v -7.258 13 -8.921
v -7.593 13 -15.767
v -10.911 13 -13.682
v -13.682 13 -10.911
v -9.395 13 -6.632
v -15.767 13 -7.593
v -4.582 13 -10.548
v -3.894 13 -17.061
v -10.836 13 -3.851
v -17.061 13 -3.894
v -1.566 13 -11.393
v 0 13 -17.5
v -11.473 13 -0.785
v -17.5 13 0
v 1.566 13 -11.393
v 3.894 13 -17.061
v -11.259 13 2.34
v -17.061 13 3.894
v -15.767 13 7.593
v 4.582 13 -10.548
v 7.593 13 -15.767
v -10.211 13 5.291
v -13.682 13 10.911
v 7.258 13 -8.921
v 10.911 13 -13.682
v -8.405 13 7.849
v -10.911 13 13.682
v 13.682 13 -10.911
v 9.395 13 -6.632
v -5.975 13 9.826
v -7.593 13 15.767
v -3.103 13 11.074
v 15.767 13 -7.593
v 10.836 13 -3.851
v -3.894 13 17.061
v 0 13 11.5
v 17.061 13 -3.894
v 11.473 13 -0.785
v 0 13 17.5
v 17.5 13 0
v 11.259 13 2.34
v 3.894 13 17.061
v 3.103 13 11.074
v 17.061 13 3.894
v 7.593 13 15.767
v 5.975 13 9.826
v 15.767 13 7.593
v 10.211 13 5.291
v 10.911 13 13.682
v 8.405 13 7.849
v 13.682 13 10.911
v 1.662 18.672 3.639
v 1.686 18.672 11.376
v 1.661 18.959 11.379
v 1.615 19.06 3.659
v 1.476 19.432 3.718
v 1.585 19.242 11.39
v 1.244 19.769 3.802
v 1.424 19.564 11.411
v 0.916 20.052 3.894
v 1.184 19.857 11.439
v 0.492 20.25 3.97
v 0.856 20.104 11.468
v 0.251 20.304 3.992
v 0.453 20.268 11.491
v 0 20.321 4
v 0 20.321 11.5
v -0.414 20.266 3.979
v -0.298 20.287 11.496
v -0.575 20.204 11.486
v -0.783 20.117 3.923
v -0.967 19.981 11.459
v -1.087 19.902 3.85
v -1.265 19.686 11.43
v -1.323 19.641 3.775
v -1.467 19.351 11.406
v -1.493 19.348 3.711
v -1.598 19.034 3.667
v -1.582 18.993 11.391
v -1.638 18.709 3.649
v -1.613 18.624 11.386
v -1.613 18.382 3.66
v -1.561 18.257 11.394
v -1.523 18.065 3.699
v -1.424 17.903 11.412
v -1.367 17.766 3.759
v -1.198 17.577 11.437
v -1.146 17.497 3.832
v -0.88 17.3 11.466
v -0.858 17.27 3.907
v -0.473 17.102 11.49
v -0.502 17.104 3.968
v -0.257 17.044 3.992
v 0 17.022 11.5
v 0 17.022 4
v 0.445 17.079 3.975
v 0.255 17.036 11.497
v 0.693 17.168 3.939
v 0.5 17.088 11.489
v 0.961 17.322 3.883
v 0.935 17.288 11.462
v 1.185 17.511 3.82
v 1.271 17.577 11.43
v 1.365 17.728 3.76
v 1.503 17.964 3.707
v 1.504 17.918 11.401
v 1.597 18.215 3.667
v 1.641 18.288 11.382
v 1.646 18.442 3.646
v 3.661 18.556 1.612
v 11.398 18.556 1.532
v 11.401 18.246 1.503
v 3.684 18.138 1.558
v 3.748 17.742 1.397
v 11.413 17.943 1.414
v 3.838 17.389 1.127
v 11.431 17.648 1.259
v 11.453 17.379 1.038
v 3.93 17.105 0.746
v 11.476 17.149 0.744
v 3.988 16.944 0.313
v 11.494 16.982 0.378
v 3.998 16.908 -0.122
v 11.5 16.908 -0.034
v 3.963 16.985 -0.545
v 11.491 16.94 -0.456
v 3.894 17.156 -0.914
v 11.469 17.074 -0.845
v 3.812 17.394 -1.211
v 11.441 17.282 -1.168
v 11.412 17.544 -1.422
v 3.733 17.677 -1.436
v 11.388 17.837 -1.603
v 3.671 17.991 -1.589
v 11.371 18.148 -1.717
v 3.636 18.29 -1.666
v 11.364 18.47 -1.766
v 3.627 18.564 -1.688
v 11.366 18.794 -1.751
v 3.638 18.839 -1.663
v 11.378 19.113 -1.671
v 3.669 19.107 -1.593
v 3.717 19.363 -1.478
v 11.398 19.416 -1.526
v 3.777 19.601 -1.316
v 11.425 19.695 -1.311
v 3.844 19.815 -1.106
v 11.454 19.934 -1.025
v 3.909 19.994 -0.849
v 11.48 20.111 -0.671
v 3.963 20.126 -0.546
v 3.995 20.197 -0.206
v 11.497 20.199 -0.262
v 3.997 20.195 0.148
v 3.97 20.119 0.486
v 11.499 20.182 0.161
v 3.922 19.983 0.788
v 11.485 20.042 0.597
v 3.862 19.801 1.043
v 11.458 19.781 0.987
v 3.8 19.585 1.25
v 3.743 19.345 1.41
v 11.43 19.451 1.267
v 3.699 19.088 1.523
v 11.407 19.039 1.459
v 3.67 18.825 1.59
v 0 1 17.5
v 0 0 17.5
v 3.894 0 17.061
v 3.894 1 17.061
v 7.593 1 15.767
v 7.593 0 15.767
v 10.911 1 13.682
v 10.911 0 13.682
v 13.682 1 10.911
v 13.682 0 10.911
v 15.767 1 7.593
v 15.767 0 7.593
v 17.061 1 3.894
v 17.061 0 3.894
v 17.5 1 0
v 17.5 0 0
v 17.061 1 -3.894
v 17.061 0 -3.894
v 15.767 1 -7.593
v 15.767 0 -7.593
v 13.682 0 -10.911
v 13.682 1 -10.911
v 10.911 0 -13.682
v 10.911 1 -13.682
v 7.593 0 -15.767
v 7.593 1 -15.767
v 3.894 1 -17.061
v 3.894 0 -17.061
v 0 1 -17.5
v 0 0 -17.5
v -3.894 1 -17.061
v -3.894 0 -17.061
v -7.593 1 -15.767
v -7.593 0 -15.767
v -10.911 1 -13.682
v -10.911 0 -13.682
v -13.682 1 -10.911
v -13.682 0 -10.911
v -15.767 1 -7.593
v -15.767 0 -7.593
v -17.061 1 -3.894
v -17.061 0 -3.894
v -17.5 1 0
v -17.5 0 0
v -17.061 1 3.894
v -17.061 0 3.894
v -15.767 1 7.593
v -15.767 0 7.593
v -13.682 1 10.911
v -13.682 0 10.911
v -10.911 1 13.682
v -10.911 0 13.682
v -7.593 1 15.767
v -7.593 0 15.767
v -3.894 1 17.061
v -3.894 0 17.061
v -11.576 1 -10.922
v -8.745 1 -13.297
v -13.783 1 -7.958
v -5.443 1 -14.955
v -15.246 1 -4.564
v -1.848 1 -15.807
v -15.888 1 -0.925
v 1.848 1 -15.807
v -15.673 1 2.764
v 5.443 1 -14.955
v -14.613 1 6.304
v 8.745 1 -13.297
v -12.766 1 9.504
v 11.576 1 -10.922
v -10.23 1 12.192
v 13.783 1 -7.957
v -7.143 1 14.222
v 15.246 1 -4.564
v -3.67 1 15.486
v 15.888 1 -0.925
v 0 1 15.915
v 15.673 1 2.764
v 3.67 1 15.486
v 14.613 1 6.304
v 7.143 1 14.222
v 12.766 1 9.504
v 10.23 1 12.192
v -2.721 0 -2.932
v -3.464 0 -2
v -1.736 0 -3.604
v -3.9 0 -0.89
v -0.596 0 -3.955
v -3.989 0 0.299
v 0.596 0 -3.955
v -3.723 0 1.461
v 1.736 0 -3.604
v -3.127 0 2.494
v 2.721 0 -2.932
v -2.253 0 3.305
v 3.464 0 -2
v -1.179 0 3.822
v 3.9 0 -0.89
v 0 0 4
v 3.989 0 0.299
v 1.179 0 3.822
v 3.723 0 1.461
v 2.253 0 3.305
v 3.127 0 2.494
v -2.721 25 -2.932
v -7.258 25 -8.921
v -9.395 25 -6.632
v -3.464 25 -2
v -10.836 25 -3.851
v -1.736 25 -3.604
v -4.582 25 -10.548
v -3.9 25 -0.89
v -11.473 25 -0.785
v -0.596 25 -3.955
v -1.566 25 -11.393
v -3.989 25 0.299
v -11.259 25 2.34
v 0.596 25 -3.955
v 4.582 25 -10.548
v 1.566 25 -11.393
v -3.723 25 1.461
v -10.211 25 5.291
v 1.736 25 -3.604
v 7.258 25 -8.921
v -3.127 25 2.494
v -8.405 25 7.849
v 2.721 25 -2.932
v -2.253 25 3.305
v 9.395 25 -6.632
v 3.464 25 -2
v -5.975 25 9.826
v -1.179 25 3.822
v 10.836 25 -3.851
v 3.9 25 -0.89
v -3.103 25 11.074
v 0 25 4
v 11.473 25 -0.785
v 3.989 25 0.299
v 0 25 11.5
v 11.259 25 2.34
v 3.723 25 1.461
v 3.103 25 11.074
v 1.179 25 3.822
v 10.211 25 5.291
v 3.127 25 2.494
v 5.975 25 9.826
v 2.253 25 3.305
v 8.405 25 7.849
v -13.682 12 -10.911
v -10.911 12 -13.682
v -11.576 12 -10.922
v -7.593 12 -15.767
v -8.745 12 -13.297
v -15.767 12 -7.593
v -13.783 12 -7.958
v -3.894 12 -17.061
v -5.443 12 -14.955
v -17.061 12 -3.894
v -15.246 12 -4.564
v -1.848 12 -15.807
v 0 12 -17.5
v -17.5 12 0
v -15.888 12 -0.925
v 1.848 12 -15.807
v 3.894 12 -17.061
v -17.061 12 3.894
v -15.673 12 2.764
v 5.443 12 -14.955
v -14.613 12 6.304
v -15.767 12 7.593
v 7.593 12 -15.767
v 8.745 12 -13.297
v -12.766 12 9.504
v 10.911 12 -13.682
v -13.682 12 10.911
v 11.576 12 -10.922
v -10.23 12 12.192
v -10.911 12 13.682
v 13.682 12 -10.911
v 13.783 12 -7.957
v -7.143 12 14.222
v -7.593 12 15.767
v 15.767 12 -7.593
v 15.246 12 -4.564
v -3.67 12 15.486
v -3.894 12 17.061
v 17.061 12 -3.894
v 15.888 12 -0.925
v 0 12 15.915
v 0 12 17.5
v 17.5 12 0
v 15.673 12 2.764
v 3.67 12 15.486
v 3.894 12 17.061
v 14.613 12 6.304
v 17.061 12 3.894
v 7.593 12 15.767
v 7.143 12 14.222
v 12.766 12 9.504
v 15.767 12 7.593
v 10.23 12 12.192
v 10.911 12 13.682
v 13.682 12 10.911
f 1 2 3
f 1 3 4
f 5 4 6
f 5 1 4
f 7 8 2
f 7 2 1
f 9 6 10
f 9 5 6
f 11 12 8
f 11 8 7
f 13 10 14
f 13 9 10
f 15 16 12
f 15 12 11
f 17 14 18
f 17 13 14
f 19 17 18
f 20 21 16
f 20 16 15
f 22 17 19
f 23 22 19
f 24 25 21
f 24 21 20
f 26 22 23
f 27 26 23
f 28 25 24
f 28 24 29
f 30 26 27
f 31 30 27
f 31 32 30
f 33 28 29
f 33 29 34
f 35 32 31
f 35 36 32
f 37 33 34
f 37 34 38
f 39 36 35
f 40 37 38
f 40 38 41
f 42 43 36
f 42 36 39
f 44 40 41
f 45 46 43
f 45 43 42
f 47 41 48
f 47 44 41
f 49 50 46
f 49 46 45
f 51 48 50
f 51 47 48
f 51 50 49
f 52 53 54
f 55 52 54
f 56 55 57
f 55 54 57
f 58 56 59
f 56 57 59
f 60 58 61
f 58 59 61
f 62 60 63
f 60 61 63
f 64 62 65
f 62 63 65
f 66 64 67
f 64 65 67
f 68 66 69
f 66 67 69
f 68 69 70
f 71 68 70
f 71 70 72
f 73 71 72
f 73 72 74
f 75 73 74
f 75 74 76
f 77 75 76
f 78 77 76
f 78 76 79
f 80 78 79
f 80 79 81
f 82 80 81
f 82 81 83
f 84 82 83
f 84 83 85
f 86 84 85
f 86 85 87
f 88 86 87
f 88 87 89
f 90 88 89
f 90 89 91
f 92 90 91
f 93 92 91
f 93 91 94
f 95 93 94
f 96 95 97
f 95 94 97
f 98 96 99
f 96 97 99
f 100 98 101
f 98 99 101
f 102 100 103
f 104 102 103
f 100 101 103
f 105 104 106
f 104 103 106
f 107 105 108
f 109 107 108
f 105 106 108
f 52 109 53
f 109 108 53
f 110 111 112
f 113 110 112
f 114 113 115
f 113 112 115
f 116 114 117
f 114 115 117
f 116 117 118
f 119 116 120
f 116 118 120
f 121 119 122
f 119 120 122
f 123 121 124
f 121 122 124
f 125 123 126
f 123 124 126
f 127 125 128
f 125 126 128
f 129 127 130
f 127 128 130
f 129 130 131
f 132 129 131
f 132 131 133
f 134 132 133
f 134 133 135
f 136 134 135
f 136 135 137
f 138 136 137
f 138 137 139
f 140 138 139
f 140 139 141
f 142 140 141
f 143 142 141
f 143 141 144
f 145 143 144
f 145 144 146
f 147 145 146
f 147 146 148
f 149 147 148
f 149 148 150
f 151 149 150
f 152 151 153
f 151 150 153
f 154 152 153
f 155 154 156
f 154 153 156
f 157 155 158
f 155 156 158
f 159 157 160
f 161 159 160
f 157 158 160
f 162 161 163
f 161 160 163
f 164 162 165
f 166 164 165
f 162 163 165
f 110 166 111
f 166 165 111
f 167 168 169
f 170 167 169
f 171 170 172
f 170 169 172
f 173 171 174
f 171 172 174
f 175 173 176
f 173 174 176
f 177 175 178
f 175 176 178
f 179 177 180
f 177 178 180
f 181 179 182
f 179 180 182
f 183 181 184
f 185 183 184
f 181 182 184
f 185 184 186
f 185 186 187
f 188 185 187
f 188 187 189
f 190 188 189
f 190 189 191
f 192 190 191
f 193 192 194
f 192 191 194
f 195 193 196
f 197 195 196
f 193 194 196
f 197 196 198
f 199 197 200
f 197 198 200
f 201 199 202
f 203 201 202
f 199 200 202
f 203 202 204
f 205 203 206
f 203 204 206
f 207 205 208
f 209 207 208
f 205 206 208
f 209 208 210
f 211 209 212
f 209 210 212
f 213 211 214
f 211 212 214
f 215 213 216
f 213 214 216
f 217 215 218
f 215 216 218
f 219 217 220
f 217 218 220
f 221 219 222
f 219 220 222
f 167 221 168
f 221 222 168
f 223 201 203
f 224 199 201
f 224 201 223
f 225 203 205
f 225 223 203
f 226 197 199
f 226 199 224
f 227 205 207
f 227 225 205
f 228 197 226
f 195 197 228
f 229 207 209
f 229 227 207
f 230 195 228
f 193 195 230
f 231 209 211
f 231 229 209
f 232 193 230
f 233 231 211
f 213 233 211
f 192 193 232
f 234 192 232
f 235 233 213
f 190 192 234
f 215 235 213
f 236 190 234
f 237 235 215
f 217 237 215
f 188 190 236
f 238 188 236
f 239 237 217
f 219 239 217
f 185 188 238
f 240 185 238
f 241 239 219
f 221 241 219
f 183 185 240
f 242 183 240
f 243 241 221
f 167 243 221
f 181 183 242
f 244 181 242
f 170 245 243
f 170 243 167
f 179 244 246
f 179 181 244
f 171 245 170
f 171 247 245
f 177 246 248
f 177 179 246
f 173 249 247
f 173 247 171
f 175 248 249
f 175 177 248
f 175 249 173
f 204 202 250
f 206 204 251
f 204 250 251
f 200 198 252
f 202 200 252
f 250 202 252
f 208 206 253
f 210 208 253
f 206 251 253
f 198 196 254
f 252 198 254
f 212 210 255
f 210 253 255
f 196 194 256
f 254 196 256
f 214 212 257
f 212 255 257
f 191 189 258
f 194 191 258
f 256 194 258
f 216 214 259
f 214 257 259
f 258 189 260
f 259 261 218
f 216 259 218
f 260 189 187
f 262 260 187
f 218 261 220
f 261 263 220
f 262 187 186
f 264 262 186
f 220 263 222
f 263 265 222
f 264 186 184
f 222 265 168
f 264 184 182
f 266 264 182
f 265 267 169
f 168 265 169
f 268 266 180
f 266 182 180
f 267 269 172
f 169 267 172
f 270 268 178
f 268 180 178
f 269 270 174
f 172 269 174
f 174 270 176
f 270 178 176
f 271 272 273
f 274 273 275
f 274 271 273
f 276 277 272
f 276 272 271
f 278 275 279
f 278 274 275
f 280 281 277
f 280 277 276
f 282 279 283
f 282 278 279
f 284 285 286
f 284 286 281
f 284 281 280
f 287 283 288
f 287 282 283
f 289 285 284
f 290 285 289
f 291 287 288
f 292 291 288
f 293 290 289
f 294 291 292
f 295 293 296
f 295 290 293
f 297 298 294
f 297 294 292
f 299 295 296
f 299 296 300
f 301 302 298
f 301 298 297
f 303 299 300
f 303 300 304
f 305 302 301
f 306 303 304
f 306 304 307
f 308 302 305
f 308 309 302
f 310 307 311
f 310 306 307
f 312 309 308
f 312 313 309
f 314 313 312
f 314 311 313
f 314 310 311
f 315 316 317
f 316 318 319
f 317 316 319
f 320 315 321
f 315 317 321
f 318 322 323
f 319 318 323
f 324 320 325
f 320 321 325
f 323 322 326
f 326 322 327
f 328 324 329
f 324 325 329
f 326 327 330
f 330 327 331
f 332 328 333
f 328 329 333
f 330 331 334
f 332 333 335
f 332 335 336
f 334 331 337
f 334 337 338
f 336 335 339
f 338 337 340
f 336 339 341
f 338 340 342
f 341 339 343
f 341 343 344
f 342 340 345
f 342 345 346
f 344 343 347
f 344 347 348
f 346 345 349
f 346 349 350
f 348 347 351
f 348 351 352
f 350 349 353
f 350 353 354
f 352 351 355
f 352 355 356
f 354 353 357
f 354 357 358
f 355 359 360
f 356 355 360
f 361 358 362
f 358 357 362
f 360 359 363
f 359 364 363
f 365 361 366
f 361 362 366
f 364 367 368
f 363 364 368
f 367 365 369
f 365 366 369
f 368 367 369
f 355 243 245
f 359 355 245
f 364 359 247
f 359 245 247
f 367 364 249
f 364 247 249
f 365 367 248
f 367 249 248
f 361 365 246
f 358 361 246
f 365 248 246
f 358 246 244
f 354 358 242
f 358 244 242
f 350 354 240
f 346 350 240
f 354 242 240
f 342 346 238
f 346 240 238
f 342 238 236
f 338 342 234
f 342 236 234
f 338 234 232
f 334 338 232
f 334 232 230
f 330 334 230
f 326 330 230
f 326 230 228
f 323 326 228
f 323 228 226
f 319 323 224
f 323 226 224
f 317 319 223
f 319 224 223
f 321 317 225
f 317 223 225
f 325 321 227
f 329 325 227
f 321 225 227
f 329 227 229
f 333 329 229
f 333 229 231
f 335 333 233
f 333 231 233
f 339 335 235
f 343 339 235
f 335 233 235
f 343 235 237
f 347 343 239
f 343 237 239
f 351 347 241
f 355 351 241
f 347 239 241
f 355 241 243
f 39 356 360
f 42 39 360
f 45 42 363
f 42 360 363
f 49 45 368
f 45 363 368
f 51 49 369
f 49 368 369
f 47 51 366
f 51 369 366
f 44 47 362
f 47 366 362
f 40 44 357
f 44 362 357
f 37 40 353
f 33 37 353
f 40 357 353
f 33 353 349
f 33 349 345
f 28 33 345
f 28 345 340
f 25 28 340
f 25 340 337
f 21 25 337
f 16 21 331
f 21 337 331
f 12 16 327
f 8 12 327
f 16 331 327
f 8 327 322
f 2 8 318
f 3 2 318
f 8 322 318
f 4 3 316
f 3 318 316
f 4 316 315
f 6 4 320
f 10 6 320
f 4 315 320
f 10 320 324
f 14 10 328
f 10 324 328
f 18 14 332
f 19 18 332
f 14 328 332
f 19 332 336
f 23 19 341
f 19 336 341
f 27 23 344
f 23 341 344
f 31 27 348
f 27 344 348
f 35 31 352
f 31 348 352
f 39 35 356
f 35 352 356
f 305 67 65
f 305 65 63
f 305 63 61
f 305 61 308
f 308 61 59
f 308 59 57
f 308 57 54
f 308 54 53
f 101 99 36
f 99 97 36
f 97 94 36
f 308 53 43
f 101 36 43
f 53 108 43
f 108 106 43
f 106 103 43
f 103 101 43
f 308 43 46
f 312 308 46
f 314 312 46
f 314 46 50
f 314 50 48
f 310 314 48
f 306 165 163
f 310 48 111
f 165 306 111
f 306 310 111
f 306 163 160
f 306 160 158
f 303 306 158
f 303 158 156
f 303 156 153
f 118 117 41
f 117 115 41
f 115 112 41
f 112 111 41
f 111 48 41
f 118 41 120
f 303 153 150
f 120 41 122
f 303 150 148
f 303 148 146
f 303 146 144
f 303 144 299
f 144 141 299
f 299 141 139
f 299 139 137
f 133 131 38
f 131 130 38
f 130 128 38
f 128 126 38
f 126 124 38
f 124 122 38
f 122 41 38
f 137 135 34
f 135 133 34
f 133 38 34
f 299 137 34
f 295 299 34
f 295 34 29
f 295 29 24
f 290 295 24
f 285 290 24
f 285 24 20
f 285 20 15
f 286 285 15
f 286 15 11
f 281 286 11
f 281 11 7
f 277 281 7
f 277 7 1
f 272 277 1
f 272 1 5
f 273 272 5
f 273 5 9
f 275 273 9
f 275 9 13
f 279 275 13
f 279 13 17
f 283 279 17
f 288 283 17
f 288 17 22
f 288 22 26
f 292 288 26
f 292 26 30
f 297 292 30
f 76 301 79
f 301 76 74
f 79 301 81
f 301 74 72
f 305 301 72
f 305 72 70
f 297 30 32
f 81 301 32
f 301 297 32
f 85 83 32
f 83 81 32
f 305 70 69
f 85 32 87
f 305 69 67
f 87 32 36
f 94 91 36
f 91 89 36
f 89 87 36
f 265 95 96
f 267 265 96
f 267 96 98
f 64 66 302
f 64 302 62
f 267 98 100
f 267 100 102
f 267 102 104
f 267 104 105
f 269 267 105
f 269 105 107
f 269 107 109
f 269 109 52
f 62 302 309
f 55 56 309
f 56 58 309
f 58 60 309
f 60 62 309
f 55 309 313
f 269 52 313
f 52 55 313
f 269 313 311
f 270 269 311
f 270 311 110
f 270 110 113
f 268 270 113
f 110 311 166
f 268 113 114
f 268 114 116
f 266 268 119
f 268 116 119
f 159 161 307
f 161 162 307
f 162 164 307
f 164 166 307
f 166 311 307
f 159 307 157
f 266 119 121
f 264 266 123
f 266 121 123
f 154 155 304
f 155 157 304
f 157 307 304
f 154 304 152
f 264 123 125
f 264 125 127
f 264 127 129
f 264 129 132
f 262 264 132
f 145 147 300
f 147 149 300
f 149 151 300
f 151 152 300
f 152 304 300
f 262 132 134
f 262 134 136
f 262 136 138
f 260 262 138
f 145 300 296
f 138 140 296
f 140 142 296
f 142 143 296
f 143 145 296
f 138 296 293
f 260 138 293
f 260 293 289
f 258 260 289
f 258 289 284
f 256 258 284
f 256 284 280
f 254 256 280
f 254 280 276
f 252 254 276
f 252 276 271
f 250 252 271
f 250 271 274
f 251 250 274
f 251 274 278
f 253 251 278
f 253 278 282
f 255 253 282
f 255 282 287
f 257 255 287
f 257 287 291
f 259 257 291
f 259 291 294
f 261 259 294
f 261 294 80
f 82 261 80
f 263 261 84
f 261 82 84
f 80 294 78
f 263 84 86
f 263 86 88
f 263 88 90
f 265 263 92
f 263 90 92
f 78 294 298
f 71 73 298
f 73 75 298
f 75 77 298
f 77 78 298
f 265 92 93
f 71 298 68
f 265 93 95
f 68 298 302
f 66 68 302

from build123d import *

# Parameters (mm, degrees)
SKETCH_1_R                       = 17.5
EXTRUDE_1_DEPTH                  = 1
SKETCH_2_R                       = 15.915
EXTRUDE_2_DEPTH                  = 11
SKETCH_3_R                       = 17.5
EXTRUDE_3_DEPTH                  = 1
SKETCH_4_R                       = 11.5
EXTRUDE_4_DEPTH                  = 12
SKETCH_5_R                       = 4
CUT_EXTRUDE_1_DEPTH              = 36.178118199
HOLE_WIZARD_M4_1_REACH           = 40.674
HOLE_WIZARD_M4_1_BORE_R          = 1.65
HOLE_WIZARD_M4_1_ON_FACE_2_REACH = 40.693
HOLE_WIZARD_M4_1_BORE_2_R        = 1.65


with BuildPart() as part:
    # 草图1 → 凸台-拉伸1 (new body)
    with BuildSketch(Plane(origin=(0, 0, 0), x_dir=(1, 0, 0), z_dir=(0, 1, 0))):
        with Locations(Location((0, 0, 0), (0, 0, 270))):
            Circle(SKETCH_1_R)
    extrude(amount=EXTRUDE_1_DEPTH)

    # 草图2 → 凸台-拉伸2 (add)
    with BuildSketch(Plane(origin=(0, 1, 0), x_dir=(1, 0, 0), z_dir=(0, 1, 0))):
        with Locations(Location((0, 0, 0), (0, 0, 270))):
            Circle(SKETCH_2_R)
    extrude(amount=EXTRUDE_2_DEPTH)

    # 草图3 → 凸台-拉伸3 (add)
    with BuildSketch(Plane(origin=(0, 12, 0), x_dir=(1, 0, 0), z_dir=(0, 1, 0))):
        with Locations(Location((0, 0, 0), (0, 0, 270))):
            Circle(SKETCH_3_R)
    extrude(amount=EXTRUDE_3_DEPTH)

    # 草图4 → 凸台-拉伸4 (add)
    with BuildSketch(Plane(origin=(0, 13, 0), x_dir=(1, 0, 0), z_dir=(0, 1, 0))):
        with Locations(Location((0, 0, 0), (0, 0, 270))):
            Circle(SKETCH_4_R)
    extrude(amount=EXTRUDE_4_DEPTH)

    # 草图5 → 切除-拉伸1 (cut, through all)
    with BuildSketch(Plane(origin=(0, 25, 0), x_dir=(1, 0, 0), z_dir=(0, 1, 0))):
        with Locations(Location((0, 0, 0), (0, 0, 270))):
            Circle(SKETCH_5_R)
    extrude(amount=-CUT_EXTRUDE_1_DEPTH, mode=Mode.SUBTRACT)

    # M4 螺纹孔1 bore (on position points) → M4 螺纹孔1 (cut, up to next)
    with BuildSketch(Plane(origin=(11.499382171, 18.555582634, -0.119204379), x_dir=(0.010365598164, 0, 0.999946275744), z_dir=(0.999946275744, 0, -0.010365598164)), mode=Mode.PRIVATE) as hole_wizard_m4_1_sk1:
        Circle(HOLE_WIZARD_M4_1_BORE_R)
    hole_wizard_m4_1_tool1 = extrude(hole_wizard_m4_1_sk1.sketch, amount=-HOLE_WIZARD_M4_1_REACH, mode=Mode.PRIVATE) & part.part
    add(hole_wizard_m4_1_tool1.solids().sort_by_distance((11.499382, 18.555583, -0.119204))[0], mode=Mode.SUBTRACT)

    # M4 螺纹孔1 bore 2 (on position points) → M4 螺纹孔1 on face 2 (cut, up to next)
    with BuildSketch(Plane(origin=(0.03684499, 18.671535984, 11.499940976), x_dir=(0.99999486718, 0, -0.003203999574), z_dir=(0.003203999574, 0, 0.99999486718)), mode=Mode.PRIVATE) as hole_wizard_m4_1_on_face_2_sk1:
        Circle(HOLE_WIZARD_M4_1_BORE_2_R)
    hole_wizard_m4_1_on_face_2_tool1 = extrude(hole_wizard_m4_1_on_face_2_sk1.sketch, amount=-HOLE_WIZARD_M4_1_ON_FACE_2_REACH, mode=Mode.PRIVATE) & part.part
    add(hole_wizard_m4_1_on_face_2_tool1.solids().sort_by_distance((0.036845, 18.671536, 11.499941))[0], mode=Mode.SUBTRACT)


solid = part.part
